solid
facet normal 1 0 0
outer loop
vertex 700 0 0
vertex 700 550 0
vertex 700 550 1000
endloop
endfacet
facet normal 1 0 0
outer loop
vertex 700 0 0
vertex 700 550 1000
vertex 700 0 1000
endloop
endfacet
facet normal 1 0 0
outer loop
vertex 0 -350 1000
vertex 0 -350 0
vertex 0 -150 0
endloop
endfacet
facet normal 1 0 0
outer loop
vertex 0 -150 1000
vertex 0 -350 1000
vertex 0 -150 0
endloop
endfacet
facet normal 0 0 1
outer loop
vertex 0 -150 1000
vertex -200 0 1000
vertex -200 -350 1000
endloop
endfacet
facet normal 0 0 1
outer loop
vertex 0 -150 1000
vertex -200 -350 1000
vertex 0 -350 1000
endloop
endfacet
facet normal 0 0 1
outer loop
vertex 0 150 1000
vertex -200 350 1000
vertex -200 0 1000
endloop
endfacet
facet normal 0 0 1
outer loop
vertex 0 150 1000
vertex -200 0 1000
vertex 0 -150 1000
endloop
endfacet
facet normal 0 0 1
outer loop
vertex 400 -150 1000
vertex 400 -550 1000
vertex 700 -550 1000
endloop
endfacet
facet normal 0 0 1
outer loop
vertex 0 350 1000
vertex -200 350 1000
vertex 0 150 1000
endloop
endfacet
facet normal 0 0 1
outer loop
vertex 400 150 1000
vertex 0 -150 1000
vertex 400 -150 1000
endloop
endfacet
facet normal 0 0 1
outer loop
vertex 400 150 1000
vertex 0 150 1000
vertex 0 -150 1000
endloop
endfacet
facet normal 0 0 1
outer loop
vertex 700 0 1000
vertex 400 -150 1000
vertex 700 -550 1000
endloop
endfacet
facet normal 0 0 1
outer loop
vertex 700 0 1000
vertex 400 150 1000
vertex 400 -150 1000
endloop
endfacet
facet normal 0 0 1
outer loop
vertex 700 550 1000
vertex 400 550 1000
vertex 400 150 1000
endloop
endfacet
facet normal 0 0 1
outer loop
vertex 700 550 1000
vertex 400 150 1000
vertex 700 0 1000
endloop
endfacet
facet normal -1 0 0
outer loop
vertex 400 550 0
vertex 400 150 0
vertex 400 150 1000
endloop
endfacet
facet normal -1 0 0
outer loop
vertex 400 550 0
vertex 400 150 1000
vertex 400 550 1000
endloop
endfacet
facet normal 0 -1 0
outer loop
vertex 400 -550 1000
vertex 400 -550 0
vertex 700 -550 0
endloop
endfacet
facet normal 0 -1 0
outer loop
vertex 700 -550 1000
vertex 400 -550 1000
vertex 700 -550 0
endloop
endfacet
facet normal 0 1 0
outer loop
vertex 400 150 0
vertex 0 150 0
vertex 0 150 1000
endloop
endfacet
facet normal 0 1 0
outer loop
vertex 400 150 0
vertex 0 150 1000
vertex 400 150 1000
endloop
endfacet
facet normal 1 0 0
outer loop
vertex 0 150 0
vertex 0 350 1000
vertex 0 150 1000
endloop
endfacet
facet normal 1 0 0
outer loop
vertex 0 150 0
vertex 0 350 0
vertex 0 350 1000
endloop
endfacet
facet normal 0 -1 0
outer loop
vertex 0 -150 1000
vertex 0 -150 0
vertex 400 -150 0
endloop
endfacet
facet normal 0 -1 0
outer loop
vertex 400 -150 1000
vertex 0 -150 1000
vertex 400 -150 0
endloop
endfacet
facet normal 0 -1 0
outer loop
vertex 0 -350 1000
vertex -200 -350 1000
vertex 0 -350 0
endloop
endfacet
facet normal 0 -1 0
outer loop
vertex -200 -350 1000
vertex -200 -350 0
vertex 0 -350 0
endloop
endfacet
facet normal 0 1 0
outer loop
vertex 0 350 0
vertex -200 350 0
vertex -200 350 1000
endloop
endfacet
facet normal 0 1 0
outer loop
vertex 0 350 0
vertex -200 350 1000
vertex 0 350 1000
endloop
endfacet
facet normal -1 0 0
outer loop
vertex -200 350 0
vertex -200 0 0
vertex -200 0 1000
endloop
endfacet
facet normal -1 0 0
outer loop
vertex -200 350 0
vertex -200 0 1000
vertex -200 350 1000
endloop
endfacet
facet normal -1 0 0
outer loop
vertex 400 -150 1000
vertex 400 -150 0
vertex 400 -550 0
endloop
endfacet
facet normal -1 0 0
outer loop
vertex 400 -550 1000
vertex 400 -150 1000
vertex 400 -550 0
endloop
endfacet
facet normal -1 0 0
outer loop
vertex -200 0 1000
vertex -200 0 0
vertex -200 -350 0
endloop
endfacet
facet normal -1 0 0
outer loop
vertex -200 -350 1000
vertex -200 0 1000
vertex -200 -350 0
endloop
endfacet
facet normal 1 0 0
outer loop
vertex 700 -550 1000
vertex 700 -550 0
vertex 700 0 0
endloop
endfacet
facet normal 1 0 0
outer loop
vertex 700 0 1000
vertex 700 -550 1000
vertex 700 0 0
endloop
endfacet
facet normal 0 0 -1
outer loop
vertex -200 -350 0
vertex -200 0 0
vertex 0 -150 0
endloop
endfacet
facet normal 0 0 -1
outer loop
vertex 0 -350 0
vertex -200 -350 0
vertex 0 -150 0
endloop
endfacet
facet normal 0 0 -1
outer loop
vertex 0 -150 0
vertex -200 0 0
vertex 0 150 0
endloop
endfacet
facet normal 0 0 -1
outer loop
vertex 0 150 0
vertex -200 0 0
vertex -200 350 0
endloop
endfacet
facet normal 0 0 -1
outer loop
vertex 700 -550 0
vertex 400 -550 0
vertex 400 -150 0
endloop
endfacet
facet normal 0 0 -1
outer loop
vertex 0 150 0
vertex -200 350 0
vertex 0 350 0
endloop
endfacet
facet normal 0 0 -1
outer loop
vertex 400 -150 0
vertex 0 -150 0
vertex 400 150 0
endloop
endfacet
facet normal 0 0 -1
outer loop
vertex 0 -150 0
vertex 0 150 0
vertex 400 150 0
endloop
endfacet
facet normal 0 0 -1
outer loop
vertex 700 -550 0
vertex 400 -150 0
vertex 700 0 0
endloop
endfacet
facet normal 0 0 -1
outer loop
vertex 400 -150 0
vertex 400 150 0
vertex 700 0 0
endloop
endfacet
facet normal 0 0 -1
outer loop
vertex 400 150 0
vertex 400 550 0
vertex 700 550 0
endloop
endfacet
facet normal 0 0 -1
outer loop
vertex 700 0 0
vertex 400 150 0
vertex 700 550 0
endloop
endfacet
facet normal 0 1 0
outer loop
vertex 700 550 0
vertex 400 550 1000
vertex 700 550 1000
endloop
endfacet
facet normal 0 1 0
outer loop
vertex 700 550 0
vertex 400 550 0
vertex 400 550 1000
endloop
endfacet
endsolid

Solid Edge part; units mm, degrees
sketch "Sketch1" plane through (0, 0, 0) normal (0, 0, 1) x (1, 0, 0)
  line L0 (400, -150) -> (400, -550)
  line L1 (400, -550) -> (700, -550)
  line L2 (700, -550) -> (700, 0)
  line L3 (700, 550) -> (700, 0)
  line L4 (400, 550) -> (700, 550)
  line L5 (400, 150) -> (400, 550)
  line L6 (0, 150) -> (400, 150)
  line L7 (0, 350) -> (0, 150)
  line L8 (-200, 350) -> (0, 350)
  line L9 (-200, 0) -> (-200, 350)
  line L10 (-200, 0) -> (-200, -350)
  line L11 (-200, -350) -> (0, -350)
  line L12 (0, -350) -> (0, -150)
  line L13 (0, -150) -> (400, -150)
extrude "Protrusion1" add sketch "Sketch1" along normal blind 1000
